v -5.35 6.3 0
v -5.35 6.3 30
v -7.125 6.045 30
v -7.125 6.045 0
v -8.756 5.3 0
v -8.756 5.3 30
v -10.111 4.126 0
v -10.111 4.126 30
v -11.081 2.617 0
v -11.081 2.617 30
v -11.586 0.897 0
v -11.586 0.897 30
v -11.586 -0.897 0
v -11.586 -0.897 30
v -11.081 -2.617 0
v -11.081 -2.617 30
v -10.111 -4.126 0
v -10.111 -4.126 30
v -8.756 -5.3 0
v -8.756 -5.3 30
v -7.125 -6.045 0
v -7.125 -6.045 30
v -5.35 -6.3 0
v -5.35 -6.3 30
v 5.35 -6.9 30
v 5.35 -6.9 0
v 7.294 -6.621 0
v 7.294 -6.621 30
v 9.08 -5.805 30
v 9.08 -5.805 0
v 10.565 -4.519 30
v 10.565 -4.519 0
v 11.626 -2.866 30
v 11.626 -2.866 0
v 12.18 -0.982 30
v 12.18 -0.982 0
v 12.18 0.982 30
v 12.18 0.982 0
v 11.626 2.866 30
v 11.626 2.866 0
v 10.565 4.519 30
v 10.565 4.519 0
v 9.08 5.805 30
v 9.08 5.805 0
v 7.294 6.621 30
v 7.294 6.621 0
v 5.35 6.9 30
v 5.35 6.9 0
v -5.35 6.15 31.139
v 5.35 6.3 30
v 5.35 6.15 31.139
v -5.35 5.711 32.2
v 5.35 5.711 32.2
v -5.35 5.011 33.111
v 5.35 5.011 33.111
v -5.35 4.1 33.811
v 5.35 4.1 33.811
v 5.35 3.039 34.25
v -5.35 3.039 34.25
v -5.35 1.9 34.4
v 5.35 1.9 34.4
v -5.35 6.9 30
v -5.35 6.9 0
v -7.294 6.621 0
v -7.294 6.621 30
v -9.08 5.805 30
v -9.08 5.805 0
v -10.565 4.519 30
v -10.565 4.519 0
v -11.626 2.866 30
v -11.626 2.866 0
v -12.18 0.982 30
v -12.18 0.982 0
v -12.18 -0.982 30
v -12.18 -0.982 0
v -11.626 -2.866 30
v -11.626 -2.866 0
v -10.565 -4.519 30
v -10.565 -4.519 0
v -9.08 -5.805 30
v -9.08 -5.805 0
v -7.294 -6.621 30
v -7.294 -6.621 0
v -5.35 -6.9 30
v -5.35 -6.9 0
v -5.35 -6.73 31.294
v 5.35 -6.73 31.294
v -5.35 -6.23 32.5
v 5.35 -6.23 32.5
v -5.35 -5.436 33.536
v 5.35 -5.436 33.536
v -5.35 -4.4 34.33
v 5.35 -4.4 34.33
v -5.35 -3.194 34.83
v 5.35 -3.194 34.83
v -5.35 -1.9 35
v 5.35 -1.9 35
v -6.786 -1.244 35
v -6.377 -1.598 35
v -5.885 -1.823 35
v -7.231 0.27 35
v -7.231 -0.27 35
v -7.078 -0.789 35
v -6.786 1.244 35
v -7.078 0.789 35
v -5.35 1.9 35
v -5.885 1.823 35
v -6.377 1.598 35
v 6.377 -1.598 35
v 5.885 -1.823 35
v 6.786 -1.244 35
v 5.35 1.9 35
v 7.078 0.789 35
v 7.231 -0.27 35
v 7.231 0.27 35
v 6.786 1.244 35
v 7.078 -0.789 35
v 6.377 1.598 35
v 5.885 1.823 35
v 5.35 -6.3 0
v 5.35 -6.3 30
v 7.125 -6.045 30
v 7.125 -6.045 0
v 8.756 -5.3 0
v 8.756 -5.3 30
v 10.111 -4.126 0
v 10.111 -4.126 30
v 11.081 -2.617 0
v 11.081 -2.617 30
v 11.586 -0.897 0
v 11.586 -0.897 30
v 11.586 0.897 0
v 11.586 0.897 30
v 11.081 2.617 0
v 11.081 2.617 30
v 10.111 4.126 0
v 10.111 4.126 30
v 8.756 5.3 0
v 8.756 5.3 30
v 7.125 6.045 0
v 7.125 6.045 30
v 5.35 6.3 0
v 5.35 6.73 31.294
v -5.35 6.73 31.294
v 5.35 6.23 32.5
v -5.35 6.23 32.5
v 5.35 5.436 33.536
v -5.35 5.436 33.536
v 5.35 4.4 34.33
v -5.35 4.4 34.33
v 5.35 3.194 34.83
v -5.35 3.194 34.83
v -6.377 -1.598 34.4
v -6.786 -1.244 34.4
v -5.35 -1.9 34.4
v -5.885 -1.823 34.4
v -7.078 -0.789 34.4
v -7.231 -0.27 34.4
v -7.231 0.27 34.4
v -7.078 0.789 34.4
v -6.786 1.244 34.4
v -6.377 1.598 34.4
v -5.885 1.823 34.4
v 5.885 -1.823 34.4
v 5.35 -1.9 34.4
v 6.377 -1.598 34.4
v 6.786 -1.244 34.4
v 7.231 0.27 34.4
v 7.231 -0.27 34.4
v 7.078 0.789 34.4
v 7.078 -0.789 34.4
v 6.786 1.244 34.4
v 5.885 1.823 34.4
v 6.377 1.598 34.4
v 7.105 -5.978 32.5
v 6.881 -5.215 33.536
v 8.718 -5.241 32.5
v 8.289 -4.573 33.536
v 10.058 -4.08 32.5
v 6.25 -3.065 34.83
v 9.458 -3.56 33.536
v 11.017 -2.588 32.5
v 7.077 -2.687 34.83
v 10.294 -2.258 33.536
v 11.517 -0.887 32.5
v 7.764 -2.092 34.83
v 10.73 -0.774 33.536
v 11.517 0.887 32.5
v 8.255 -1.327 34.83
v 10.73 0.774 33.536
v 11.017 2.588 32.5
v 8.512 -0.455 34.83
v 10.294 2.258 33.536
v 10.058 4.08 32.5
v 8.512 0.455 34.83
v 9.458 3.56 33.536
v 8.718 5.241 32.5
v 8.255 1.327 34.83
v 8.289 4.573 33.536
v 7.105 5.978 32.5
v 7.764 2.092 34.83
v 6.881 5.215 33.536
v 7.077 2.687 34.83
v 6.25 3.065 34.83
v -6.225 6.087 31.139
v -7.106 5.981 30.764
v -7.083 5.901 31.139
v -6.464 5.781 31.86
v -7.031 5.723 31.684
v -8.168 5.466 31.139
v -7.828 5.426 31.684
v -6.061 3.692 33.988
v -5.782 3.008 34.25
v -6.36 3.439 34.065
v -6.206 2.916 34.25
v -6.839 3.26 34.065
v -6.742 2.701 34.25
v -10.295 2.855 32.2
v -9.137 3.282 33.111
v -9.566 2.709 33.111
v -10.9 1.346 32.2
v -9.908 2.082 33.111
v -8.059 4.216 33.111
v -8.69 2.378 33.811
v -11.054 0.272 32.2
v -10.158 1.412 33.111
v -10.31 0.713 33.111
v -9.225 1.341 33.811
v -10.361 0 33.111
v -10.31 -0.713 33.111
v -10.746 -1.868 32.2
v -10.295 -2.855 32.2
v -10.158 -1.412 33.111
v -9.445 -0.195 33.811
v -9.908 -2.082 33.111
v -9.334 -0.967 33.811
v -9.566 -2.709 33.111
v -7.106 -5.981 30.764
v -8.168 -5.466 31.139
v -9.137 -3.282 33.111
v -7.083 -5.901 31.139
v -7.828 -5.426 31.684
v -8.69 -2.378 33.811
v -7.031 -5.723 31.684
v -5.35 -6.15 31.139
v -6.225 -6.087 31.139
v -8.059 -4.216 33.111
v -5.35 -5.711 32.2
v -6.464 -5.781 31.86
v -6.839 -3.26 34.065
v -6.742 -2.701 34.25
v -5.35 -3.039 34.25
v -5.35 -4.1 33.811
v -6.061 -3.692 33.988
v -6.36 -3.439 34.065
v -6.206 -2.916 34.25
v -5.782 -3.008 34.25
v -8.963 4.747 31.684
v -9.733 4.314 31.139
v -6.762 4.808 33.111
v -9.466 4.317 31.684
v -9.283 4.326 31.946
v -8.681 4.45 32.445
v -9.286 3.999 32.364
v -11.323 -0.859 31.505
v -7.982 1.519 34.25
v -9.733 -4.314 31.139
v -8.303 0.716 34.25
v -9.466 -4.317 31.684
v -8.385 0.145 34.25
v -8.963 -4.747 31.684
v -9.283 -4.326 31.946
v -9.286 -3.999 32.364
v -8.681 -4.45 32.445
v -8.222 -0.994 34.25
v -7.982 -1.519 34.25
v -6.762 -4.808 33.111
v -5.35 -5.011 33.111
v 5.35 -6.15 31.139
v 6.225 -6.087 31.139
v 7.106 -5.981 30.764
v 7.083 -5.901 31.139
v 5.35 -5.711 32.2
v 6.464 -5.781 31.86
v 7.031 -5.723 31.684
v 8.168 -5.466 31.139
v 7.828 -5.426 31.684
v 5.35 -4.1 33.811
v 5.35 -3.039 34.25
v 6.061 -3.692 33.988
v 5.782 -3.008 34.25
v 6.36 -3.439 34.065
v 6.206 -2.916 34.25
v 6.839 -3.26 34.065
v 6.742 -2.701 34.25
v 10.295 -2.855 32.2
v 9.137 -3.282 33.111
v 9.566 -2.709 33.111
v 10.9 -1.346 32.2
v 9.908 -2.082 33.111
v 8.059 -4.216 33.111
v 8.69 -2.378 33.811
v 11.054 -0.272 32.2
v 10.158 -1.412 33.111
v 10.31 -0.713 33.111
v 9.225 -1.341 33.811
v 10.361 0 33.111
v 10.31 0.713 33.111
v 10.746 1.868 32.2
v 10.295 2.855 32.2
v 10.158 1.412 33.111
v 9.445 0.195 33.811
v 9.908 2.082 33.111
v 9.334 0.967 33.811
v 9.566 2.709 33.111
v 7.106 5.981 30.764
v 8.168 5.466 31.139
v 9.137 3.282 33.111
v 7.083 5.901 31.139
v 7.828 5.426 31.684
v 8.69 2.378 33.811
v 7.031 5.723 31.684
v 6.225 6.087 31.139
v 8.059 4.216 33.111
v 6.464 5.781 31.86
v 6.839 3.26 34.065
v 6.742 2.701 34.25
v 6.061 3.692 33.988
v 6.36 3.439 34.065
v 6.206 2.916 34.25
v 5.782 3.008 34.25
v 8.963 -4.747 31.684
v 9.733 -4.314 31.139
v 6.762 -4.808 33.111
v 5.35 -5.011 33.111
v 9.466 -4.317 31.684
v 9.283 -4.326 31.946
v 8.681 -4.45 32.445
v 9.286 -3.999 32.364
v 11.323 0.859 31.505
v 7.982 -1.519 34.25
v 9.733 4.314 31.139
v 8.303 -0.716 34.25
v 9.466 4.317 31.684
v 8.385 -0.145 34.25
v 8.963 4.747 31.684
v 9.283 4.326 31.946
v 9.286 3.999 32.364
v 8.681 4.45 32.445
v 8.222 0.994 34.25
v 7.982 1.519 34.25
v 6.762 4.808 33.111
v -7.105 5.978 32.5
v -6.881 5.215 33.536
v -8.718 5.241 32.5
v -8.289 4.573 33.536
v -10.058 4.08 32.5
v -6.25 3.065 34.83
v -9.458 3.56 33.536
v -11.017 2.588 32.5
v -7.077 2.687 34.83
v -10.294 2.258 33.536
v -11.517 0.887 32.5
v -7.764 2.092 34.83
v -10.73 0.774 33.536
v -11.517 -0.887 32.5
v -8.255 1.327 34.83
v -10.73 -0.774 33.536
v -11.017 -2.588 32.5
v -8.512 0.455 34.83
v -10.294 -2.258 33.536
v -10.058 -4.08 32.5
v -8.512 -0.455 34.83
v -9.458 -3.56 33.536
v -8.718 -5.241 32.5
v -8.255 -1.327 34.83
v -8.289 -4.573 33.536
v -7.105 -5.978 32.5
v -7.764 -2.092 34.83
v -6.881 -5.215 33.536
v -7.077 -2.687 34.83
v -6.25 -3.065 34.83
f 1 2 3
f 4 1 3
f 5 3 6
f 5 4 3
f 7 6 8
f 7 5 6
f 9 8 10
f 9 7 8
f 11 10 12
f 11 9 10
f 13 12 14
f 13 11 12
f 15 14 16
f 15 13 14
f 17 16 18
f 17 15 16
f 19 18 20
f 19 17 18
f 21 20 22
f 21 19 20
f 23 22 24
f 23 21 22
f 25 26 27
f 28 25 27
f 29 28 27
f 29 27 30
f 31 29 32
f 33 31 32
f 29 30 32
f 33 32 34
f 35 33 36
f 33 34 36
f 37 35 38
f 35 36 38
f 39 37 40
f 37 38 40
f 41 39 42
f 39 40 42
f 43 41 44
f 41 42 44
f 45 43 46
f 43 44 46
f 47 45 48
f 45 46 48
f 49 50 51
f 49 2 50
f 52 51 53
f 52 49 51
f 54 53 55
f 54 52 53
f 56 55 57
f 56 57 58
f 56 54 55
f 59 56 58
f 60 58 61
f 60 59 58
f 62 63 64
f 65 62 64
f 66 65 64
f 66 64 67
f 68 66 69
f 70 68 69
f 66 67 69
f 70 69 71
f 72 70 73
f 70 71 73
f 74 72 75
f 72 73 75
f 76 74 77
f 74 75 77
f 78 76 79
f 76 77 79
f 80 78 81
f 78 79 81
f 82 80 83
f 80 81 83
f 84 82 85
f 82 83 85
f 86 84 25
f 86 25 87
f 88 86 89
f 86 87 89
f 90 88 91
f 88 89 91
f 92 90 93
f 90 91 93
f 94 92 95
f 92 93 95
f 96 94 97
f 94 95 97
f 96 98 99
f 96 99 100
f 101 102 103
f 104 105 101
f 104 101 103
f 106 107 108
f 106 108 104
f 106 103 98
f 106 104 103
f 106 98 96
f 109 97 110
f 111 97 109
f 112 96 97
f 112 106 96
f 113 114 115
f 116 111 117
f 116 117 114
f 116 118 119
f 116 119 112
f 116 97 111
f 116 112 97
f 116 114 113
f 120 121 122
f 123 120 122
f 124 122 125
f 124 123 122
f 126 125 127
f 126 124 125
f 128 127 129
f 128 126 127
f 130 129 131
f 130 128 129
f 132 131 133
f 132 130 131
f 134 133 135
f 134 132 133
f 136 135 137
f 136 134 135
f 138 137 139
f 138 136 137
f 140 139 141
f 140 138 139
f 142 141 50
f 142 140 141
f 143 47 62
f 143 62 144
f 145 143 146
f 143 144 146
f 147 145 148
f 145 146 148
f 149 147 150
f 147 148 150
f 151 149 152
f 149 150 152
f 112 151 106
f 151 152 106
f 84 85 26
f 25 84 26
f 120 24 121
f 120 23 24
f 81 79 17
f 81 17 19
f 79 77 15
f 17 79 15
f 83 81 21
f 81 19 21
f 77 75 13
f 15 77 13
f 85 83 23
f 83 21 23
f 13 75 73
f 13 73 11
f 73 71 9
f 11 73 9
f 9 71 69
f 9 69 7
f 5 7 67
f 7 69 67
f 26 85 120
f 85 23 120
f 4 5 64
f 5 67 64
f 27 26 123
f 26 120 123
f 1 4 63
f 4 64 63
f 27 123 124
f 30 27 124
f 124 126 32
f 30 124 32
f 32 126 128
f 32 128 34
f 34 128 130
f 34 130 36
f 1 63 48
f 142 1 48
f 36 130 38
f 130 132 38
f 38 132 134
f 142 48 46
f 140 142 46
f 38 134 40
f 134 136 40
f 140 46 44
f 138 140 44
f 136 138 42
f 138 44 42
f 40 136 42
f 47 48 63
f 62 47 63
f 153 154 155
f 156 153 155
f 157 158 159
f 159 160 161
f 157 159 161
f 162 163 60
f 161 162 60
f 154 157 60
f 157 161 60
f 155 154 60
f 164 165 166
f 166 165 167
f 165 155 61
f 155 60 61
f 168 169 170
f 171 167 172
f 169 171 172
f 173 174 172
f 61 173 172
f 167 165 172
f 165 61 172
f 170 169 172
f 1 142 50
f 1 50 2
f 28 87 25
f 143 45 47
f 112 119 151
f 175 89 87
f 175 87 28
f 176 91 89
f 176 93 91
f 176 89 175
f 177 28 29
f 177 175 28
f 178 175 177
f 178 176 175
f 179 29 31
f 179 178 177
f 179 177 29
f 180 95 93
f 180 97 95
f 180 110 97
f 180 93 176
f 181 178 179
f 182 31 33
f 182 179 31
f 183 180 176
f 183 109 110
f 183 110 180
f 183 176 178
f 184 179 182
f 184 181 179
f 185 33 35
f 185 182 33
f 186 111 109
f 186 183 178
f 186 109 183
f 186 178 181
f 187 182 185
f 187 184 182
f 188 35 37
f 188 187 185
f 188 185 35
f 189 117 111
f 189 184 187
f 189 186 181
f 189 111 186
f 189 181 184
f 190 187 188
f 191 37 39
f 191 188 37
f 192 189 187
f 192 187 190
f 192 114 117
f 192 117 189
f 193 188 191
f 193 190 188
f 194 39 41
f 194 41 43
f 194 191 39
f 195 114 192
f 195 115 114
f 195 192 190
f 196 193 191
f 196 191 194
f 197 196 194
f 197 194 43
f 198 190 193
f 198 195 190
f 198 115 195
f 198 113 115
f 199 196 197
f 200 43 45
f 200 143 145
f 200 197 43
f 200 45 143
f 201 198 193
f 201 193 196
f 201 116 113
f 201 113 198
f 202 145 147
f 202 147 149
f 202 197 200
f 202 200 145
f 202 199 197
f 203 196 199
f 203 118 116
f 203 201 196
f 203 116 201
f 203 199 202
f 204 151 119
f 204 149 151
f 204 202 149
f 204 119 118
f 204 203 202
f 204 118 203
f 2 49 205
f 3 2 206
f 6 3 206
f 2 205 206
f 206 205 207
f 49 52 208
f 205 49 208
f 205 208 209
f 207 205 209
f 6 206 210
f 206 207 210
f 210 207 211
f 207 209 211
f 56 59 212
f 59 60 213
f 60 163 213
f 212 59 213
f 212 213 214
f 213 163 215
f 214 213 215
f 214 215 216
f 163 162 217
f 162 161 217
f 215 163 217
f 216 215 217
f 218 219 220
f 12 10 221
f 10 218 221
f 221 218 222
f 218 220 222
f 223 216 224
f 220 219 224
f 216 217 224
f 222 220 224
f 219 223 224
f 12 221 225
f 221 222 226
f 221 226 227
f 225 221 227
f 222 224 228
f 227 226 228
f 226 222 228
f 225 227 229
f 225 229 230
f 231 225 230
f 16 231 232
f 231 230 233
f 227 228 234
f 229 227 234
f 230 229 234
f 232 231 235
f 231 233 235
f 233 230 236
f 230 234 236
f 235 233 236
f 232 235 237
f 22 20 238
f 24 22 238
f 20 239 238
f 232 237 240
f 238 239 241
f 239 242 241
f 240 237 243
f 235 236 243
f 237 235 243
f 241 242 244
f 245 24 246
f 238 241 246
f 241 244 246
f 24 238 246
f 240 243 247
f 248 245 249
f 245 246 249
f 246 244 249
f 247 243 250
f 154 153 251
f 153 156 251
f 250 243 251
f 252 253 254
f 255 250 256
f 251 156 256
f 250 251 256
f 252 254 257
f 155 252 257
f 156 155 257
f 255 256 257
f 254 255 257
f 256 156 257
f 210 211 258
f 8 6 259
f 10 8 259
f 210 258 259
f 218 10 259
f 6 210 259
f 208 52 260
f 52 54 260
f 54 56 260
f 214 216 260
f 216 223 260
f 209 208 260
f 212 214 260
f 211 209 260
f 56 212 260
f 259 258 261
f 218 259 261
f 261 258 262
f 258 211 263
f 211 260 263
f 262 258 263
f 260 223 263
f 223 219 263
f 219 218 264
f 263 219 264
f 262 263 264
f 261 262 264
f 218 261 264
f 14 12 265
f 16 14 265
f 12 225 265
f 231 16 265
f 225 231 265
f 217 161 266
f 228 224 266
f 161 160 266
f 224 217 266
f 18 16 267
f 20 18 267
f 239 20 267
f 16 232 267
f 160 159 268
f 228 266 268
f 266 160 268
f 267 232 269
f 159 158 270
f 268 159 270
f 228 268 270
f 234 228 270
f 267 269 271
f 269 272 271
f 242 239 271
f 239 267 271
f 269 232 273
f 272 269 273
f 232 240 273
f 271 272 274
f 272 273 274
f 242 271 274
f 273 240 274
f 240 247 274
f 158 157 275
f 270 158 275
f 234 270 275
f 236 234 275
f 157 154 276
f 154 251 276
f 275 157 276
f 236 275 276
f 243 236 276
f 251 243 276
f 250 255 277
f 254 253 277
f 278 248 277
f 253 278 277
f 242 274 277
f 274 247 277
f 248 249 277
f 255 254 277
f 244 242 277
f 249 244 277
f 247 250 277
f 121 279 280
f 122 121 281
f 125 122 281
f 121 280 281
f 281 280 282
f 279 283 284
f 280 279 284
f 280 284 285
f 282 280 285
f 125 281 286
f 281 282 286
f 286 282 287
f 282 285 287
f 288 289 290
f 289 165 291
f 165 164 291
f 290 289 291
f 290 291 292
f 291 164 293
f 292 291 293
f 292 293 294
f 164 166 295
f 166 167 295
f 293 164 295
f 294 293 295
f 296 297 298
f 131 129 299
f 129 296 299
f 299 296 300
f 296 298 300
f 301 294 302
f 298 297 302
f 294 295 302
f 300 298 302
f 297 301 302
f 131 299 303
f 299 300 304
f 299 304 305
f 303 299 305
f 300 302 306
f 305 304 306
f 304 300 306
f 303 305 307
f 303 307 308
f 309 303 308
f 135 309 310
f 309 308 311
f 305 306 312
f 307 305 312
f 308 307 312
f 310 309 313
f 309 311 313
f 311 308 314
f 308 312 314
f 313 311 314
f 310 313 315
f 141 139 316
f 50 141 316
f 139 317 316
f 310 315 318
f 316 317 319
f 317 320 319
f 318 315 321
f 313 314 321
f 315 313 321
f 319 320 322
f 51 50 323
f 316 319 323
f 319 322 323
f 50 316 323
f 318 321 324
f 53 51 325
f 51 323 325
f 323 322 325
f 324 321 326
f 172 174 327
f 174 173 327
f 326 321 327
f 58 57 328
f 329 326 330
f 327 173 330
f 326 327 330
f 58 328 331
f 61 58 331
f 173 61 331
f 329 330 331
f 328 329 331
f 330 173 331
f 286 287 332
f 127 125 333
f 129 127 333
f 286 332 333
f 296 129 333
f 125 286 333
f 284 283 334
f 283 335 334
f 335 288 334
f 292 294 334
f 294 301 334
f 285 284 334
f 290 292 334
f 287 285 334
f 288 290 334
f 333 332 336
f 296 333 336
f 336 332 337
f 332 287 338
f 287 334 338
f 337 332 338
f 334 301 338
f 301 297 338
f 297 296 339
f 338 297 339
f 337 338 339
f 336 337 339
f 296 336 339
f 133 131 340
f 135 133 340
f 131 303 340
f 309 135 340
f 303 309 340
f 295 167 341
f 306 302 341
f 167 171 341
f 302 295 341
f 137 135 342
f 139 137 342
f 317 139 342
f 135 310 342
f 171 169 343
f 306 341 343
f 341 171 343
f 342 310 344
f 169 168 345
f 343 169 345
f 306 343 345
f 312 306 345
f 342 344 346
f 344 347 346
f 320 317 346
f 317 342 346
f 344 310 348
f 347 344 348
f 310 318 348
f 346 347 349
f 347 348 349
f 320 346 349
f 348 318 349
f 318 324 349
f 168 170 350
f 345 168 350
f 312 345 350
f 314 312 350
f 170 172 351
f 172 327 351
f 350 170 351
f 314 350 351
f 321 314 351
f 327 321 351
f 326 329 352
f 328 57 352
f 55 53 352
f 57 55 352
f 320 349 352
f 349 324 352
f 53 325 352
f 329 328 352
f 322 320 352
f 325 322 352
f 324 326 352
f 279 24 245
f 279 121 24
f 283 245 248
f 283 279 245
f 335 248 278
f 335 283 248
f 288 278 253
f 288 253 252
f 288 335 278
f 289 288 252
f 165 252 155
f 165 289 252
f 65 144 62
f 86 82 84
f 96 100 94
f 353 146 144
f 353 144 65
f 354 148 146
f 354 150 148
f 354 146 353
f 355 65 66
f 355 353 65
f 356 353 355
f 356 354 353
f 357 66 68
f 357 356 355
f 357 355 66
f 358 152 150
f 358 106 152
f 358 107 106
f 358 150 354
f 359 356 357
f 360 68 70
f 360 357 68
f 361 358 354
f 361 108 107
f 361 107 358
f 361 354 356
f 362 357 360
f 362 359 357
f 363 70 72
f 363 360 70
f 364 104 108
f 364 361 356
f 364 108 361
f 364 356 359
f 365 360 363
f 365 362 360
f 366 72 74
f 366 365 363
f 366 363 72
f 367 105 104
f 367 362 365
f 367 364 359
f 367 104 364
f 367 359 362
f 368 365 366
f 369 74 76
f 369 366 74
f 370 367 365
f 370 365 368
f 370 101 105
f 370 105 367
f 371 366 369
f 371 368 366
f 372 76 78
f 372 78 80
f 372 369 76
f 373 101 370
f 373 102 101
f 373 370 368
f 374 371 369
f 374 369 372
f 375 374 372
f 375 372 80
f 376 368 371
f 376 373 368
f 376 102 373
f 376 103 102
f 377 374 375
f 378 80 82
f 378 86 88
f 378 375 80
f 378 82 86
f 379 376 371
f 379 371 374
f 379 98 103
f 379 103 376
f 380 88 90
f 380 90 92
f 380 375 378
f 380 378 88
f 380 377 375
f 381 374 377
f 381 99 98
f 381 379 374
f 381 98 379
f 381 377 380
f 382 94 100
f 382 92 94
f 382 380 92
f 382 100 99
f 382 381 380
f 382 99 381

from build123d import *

# Parameters (mm, degrees)
F1_DEPTH = 35
F2_R     = 5
F3_T     = -0.6


with BuildPart() as f1:
    # F0 (on Top) → F1 (new body)
    with BuildSketch(Plane.XY):
        with BuildLine():
            Line((5.35, 6.9), (-5.35, 6.9))
            ThreePointArc((-5.35, 6.9), (-12.25, 0), (-5.35, -6.9))
            Line((-5.35, -6.9), (5.35, -6.9))
            ThreePointArc((5.35, -6.9), (12.25, 0), (5.35, 6.9))
        make_face()
    extrude(amount=F1_DEPTH)

    # F2
    f2_edges = [f1.edges().sort_by_distance(p)[0] for p in [
        (0, -6.9, 35),
    ]]
    fillet(f2_edges, radius=F2_R)

    # F3
    f3_openings = [f1.faces().sort_by_distance(p)[0] for p in [
        (0, 0, 0),
    ]]
    offset(amount=F3_T, openings=f3_openings)


solid = f1.part
